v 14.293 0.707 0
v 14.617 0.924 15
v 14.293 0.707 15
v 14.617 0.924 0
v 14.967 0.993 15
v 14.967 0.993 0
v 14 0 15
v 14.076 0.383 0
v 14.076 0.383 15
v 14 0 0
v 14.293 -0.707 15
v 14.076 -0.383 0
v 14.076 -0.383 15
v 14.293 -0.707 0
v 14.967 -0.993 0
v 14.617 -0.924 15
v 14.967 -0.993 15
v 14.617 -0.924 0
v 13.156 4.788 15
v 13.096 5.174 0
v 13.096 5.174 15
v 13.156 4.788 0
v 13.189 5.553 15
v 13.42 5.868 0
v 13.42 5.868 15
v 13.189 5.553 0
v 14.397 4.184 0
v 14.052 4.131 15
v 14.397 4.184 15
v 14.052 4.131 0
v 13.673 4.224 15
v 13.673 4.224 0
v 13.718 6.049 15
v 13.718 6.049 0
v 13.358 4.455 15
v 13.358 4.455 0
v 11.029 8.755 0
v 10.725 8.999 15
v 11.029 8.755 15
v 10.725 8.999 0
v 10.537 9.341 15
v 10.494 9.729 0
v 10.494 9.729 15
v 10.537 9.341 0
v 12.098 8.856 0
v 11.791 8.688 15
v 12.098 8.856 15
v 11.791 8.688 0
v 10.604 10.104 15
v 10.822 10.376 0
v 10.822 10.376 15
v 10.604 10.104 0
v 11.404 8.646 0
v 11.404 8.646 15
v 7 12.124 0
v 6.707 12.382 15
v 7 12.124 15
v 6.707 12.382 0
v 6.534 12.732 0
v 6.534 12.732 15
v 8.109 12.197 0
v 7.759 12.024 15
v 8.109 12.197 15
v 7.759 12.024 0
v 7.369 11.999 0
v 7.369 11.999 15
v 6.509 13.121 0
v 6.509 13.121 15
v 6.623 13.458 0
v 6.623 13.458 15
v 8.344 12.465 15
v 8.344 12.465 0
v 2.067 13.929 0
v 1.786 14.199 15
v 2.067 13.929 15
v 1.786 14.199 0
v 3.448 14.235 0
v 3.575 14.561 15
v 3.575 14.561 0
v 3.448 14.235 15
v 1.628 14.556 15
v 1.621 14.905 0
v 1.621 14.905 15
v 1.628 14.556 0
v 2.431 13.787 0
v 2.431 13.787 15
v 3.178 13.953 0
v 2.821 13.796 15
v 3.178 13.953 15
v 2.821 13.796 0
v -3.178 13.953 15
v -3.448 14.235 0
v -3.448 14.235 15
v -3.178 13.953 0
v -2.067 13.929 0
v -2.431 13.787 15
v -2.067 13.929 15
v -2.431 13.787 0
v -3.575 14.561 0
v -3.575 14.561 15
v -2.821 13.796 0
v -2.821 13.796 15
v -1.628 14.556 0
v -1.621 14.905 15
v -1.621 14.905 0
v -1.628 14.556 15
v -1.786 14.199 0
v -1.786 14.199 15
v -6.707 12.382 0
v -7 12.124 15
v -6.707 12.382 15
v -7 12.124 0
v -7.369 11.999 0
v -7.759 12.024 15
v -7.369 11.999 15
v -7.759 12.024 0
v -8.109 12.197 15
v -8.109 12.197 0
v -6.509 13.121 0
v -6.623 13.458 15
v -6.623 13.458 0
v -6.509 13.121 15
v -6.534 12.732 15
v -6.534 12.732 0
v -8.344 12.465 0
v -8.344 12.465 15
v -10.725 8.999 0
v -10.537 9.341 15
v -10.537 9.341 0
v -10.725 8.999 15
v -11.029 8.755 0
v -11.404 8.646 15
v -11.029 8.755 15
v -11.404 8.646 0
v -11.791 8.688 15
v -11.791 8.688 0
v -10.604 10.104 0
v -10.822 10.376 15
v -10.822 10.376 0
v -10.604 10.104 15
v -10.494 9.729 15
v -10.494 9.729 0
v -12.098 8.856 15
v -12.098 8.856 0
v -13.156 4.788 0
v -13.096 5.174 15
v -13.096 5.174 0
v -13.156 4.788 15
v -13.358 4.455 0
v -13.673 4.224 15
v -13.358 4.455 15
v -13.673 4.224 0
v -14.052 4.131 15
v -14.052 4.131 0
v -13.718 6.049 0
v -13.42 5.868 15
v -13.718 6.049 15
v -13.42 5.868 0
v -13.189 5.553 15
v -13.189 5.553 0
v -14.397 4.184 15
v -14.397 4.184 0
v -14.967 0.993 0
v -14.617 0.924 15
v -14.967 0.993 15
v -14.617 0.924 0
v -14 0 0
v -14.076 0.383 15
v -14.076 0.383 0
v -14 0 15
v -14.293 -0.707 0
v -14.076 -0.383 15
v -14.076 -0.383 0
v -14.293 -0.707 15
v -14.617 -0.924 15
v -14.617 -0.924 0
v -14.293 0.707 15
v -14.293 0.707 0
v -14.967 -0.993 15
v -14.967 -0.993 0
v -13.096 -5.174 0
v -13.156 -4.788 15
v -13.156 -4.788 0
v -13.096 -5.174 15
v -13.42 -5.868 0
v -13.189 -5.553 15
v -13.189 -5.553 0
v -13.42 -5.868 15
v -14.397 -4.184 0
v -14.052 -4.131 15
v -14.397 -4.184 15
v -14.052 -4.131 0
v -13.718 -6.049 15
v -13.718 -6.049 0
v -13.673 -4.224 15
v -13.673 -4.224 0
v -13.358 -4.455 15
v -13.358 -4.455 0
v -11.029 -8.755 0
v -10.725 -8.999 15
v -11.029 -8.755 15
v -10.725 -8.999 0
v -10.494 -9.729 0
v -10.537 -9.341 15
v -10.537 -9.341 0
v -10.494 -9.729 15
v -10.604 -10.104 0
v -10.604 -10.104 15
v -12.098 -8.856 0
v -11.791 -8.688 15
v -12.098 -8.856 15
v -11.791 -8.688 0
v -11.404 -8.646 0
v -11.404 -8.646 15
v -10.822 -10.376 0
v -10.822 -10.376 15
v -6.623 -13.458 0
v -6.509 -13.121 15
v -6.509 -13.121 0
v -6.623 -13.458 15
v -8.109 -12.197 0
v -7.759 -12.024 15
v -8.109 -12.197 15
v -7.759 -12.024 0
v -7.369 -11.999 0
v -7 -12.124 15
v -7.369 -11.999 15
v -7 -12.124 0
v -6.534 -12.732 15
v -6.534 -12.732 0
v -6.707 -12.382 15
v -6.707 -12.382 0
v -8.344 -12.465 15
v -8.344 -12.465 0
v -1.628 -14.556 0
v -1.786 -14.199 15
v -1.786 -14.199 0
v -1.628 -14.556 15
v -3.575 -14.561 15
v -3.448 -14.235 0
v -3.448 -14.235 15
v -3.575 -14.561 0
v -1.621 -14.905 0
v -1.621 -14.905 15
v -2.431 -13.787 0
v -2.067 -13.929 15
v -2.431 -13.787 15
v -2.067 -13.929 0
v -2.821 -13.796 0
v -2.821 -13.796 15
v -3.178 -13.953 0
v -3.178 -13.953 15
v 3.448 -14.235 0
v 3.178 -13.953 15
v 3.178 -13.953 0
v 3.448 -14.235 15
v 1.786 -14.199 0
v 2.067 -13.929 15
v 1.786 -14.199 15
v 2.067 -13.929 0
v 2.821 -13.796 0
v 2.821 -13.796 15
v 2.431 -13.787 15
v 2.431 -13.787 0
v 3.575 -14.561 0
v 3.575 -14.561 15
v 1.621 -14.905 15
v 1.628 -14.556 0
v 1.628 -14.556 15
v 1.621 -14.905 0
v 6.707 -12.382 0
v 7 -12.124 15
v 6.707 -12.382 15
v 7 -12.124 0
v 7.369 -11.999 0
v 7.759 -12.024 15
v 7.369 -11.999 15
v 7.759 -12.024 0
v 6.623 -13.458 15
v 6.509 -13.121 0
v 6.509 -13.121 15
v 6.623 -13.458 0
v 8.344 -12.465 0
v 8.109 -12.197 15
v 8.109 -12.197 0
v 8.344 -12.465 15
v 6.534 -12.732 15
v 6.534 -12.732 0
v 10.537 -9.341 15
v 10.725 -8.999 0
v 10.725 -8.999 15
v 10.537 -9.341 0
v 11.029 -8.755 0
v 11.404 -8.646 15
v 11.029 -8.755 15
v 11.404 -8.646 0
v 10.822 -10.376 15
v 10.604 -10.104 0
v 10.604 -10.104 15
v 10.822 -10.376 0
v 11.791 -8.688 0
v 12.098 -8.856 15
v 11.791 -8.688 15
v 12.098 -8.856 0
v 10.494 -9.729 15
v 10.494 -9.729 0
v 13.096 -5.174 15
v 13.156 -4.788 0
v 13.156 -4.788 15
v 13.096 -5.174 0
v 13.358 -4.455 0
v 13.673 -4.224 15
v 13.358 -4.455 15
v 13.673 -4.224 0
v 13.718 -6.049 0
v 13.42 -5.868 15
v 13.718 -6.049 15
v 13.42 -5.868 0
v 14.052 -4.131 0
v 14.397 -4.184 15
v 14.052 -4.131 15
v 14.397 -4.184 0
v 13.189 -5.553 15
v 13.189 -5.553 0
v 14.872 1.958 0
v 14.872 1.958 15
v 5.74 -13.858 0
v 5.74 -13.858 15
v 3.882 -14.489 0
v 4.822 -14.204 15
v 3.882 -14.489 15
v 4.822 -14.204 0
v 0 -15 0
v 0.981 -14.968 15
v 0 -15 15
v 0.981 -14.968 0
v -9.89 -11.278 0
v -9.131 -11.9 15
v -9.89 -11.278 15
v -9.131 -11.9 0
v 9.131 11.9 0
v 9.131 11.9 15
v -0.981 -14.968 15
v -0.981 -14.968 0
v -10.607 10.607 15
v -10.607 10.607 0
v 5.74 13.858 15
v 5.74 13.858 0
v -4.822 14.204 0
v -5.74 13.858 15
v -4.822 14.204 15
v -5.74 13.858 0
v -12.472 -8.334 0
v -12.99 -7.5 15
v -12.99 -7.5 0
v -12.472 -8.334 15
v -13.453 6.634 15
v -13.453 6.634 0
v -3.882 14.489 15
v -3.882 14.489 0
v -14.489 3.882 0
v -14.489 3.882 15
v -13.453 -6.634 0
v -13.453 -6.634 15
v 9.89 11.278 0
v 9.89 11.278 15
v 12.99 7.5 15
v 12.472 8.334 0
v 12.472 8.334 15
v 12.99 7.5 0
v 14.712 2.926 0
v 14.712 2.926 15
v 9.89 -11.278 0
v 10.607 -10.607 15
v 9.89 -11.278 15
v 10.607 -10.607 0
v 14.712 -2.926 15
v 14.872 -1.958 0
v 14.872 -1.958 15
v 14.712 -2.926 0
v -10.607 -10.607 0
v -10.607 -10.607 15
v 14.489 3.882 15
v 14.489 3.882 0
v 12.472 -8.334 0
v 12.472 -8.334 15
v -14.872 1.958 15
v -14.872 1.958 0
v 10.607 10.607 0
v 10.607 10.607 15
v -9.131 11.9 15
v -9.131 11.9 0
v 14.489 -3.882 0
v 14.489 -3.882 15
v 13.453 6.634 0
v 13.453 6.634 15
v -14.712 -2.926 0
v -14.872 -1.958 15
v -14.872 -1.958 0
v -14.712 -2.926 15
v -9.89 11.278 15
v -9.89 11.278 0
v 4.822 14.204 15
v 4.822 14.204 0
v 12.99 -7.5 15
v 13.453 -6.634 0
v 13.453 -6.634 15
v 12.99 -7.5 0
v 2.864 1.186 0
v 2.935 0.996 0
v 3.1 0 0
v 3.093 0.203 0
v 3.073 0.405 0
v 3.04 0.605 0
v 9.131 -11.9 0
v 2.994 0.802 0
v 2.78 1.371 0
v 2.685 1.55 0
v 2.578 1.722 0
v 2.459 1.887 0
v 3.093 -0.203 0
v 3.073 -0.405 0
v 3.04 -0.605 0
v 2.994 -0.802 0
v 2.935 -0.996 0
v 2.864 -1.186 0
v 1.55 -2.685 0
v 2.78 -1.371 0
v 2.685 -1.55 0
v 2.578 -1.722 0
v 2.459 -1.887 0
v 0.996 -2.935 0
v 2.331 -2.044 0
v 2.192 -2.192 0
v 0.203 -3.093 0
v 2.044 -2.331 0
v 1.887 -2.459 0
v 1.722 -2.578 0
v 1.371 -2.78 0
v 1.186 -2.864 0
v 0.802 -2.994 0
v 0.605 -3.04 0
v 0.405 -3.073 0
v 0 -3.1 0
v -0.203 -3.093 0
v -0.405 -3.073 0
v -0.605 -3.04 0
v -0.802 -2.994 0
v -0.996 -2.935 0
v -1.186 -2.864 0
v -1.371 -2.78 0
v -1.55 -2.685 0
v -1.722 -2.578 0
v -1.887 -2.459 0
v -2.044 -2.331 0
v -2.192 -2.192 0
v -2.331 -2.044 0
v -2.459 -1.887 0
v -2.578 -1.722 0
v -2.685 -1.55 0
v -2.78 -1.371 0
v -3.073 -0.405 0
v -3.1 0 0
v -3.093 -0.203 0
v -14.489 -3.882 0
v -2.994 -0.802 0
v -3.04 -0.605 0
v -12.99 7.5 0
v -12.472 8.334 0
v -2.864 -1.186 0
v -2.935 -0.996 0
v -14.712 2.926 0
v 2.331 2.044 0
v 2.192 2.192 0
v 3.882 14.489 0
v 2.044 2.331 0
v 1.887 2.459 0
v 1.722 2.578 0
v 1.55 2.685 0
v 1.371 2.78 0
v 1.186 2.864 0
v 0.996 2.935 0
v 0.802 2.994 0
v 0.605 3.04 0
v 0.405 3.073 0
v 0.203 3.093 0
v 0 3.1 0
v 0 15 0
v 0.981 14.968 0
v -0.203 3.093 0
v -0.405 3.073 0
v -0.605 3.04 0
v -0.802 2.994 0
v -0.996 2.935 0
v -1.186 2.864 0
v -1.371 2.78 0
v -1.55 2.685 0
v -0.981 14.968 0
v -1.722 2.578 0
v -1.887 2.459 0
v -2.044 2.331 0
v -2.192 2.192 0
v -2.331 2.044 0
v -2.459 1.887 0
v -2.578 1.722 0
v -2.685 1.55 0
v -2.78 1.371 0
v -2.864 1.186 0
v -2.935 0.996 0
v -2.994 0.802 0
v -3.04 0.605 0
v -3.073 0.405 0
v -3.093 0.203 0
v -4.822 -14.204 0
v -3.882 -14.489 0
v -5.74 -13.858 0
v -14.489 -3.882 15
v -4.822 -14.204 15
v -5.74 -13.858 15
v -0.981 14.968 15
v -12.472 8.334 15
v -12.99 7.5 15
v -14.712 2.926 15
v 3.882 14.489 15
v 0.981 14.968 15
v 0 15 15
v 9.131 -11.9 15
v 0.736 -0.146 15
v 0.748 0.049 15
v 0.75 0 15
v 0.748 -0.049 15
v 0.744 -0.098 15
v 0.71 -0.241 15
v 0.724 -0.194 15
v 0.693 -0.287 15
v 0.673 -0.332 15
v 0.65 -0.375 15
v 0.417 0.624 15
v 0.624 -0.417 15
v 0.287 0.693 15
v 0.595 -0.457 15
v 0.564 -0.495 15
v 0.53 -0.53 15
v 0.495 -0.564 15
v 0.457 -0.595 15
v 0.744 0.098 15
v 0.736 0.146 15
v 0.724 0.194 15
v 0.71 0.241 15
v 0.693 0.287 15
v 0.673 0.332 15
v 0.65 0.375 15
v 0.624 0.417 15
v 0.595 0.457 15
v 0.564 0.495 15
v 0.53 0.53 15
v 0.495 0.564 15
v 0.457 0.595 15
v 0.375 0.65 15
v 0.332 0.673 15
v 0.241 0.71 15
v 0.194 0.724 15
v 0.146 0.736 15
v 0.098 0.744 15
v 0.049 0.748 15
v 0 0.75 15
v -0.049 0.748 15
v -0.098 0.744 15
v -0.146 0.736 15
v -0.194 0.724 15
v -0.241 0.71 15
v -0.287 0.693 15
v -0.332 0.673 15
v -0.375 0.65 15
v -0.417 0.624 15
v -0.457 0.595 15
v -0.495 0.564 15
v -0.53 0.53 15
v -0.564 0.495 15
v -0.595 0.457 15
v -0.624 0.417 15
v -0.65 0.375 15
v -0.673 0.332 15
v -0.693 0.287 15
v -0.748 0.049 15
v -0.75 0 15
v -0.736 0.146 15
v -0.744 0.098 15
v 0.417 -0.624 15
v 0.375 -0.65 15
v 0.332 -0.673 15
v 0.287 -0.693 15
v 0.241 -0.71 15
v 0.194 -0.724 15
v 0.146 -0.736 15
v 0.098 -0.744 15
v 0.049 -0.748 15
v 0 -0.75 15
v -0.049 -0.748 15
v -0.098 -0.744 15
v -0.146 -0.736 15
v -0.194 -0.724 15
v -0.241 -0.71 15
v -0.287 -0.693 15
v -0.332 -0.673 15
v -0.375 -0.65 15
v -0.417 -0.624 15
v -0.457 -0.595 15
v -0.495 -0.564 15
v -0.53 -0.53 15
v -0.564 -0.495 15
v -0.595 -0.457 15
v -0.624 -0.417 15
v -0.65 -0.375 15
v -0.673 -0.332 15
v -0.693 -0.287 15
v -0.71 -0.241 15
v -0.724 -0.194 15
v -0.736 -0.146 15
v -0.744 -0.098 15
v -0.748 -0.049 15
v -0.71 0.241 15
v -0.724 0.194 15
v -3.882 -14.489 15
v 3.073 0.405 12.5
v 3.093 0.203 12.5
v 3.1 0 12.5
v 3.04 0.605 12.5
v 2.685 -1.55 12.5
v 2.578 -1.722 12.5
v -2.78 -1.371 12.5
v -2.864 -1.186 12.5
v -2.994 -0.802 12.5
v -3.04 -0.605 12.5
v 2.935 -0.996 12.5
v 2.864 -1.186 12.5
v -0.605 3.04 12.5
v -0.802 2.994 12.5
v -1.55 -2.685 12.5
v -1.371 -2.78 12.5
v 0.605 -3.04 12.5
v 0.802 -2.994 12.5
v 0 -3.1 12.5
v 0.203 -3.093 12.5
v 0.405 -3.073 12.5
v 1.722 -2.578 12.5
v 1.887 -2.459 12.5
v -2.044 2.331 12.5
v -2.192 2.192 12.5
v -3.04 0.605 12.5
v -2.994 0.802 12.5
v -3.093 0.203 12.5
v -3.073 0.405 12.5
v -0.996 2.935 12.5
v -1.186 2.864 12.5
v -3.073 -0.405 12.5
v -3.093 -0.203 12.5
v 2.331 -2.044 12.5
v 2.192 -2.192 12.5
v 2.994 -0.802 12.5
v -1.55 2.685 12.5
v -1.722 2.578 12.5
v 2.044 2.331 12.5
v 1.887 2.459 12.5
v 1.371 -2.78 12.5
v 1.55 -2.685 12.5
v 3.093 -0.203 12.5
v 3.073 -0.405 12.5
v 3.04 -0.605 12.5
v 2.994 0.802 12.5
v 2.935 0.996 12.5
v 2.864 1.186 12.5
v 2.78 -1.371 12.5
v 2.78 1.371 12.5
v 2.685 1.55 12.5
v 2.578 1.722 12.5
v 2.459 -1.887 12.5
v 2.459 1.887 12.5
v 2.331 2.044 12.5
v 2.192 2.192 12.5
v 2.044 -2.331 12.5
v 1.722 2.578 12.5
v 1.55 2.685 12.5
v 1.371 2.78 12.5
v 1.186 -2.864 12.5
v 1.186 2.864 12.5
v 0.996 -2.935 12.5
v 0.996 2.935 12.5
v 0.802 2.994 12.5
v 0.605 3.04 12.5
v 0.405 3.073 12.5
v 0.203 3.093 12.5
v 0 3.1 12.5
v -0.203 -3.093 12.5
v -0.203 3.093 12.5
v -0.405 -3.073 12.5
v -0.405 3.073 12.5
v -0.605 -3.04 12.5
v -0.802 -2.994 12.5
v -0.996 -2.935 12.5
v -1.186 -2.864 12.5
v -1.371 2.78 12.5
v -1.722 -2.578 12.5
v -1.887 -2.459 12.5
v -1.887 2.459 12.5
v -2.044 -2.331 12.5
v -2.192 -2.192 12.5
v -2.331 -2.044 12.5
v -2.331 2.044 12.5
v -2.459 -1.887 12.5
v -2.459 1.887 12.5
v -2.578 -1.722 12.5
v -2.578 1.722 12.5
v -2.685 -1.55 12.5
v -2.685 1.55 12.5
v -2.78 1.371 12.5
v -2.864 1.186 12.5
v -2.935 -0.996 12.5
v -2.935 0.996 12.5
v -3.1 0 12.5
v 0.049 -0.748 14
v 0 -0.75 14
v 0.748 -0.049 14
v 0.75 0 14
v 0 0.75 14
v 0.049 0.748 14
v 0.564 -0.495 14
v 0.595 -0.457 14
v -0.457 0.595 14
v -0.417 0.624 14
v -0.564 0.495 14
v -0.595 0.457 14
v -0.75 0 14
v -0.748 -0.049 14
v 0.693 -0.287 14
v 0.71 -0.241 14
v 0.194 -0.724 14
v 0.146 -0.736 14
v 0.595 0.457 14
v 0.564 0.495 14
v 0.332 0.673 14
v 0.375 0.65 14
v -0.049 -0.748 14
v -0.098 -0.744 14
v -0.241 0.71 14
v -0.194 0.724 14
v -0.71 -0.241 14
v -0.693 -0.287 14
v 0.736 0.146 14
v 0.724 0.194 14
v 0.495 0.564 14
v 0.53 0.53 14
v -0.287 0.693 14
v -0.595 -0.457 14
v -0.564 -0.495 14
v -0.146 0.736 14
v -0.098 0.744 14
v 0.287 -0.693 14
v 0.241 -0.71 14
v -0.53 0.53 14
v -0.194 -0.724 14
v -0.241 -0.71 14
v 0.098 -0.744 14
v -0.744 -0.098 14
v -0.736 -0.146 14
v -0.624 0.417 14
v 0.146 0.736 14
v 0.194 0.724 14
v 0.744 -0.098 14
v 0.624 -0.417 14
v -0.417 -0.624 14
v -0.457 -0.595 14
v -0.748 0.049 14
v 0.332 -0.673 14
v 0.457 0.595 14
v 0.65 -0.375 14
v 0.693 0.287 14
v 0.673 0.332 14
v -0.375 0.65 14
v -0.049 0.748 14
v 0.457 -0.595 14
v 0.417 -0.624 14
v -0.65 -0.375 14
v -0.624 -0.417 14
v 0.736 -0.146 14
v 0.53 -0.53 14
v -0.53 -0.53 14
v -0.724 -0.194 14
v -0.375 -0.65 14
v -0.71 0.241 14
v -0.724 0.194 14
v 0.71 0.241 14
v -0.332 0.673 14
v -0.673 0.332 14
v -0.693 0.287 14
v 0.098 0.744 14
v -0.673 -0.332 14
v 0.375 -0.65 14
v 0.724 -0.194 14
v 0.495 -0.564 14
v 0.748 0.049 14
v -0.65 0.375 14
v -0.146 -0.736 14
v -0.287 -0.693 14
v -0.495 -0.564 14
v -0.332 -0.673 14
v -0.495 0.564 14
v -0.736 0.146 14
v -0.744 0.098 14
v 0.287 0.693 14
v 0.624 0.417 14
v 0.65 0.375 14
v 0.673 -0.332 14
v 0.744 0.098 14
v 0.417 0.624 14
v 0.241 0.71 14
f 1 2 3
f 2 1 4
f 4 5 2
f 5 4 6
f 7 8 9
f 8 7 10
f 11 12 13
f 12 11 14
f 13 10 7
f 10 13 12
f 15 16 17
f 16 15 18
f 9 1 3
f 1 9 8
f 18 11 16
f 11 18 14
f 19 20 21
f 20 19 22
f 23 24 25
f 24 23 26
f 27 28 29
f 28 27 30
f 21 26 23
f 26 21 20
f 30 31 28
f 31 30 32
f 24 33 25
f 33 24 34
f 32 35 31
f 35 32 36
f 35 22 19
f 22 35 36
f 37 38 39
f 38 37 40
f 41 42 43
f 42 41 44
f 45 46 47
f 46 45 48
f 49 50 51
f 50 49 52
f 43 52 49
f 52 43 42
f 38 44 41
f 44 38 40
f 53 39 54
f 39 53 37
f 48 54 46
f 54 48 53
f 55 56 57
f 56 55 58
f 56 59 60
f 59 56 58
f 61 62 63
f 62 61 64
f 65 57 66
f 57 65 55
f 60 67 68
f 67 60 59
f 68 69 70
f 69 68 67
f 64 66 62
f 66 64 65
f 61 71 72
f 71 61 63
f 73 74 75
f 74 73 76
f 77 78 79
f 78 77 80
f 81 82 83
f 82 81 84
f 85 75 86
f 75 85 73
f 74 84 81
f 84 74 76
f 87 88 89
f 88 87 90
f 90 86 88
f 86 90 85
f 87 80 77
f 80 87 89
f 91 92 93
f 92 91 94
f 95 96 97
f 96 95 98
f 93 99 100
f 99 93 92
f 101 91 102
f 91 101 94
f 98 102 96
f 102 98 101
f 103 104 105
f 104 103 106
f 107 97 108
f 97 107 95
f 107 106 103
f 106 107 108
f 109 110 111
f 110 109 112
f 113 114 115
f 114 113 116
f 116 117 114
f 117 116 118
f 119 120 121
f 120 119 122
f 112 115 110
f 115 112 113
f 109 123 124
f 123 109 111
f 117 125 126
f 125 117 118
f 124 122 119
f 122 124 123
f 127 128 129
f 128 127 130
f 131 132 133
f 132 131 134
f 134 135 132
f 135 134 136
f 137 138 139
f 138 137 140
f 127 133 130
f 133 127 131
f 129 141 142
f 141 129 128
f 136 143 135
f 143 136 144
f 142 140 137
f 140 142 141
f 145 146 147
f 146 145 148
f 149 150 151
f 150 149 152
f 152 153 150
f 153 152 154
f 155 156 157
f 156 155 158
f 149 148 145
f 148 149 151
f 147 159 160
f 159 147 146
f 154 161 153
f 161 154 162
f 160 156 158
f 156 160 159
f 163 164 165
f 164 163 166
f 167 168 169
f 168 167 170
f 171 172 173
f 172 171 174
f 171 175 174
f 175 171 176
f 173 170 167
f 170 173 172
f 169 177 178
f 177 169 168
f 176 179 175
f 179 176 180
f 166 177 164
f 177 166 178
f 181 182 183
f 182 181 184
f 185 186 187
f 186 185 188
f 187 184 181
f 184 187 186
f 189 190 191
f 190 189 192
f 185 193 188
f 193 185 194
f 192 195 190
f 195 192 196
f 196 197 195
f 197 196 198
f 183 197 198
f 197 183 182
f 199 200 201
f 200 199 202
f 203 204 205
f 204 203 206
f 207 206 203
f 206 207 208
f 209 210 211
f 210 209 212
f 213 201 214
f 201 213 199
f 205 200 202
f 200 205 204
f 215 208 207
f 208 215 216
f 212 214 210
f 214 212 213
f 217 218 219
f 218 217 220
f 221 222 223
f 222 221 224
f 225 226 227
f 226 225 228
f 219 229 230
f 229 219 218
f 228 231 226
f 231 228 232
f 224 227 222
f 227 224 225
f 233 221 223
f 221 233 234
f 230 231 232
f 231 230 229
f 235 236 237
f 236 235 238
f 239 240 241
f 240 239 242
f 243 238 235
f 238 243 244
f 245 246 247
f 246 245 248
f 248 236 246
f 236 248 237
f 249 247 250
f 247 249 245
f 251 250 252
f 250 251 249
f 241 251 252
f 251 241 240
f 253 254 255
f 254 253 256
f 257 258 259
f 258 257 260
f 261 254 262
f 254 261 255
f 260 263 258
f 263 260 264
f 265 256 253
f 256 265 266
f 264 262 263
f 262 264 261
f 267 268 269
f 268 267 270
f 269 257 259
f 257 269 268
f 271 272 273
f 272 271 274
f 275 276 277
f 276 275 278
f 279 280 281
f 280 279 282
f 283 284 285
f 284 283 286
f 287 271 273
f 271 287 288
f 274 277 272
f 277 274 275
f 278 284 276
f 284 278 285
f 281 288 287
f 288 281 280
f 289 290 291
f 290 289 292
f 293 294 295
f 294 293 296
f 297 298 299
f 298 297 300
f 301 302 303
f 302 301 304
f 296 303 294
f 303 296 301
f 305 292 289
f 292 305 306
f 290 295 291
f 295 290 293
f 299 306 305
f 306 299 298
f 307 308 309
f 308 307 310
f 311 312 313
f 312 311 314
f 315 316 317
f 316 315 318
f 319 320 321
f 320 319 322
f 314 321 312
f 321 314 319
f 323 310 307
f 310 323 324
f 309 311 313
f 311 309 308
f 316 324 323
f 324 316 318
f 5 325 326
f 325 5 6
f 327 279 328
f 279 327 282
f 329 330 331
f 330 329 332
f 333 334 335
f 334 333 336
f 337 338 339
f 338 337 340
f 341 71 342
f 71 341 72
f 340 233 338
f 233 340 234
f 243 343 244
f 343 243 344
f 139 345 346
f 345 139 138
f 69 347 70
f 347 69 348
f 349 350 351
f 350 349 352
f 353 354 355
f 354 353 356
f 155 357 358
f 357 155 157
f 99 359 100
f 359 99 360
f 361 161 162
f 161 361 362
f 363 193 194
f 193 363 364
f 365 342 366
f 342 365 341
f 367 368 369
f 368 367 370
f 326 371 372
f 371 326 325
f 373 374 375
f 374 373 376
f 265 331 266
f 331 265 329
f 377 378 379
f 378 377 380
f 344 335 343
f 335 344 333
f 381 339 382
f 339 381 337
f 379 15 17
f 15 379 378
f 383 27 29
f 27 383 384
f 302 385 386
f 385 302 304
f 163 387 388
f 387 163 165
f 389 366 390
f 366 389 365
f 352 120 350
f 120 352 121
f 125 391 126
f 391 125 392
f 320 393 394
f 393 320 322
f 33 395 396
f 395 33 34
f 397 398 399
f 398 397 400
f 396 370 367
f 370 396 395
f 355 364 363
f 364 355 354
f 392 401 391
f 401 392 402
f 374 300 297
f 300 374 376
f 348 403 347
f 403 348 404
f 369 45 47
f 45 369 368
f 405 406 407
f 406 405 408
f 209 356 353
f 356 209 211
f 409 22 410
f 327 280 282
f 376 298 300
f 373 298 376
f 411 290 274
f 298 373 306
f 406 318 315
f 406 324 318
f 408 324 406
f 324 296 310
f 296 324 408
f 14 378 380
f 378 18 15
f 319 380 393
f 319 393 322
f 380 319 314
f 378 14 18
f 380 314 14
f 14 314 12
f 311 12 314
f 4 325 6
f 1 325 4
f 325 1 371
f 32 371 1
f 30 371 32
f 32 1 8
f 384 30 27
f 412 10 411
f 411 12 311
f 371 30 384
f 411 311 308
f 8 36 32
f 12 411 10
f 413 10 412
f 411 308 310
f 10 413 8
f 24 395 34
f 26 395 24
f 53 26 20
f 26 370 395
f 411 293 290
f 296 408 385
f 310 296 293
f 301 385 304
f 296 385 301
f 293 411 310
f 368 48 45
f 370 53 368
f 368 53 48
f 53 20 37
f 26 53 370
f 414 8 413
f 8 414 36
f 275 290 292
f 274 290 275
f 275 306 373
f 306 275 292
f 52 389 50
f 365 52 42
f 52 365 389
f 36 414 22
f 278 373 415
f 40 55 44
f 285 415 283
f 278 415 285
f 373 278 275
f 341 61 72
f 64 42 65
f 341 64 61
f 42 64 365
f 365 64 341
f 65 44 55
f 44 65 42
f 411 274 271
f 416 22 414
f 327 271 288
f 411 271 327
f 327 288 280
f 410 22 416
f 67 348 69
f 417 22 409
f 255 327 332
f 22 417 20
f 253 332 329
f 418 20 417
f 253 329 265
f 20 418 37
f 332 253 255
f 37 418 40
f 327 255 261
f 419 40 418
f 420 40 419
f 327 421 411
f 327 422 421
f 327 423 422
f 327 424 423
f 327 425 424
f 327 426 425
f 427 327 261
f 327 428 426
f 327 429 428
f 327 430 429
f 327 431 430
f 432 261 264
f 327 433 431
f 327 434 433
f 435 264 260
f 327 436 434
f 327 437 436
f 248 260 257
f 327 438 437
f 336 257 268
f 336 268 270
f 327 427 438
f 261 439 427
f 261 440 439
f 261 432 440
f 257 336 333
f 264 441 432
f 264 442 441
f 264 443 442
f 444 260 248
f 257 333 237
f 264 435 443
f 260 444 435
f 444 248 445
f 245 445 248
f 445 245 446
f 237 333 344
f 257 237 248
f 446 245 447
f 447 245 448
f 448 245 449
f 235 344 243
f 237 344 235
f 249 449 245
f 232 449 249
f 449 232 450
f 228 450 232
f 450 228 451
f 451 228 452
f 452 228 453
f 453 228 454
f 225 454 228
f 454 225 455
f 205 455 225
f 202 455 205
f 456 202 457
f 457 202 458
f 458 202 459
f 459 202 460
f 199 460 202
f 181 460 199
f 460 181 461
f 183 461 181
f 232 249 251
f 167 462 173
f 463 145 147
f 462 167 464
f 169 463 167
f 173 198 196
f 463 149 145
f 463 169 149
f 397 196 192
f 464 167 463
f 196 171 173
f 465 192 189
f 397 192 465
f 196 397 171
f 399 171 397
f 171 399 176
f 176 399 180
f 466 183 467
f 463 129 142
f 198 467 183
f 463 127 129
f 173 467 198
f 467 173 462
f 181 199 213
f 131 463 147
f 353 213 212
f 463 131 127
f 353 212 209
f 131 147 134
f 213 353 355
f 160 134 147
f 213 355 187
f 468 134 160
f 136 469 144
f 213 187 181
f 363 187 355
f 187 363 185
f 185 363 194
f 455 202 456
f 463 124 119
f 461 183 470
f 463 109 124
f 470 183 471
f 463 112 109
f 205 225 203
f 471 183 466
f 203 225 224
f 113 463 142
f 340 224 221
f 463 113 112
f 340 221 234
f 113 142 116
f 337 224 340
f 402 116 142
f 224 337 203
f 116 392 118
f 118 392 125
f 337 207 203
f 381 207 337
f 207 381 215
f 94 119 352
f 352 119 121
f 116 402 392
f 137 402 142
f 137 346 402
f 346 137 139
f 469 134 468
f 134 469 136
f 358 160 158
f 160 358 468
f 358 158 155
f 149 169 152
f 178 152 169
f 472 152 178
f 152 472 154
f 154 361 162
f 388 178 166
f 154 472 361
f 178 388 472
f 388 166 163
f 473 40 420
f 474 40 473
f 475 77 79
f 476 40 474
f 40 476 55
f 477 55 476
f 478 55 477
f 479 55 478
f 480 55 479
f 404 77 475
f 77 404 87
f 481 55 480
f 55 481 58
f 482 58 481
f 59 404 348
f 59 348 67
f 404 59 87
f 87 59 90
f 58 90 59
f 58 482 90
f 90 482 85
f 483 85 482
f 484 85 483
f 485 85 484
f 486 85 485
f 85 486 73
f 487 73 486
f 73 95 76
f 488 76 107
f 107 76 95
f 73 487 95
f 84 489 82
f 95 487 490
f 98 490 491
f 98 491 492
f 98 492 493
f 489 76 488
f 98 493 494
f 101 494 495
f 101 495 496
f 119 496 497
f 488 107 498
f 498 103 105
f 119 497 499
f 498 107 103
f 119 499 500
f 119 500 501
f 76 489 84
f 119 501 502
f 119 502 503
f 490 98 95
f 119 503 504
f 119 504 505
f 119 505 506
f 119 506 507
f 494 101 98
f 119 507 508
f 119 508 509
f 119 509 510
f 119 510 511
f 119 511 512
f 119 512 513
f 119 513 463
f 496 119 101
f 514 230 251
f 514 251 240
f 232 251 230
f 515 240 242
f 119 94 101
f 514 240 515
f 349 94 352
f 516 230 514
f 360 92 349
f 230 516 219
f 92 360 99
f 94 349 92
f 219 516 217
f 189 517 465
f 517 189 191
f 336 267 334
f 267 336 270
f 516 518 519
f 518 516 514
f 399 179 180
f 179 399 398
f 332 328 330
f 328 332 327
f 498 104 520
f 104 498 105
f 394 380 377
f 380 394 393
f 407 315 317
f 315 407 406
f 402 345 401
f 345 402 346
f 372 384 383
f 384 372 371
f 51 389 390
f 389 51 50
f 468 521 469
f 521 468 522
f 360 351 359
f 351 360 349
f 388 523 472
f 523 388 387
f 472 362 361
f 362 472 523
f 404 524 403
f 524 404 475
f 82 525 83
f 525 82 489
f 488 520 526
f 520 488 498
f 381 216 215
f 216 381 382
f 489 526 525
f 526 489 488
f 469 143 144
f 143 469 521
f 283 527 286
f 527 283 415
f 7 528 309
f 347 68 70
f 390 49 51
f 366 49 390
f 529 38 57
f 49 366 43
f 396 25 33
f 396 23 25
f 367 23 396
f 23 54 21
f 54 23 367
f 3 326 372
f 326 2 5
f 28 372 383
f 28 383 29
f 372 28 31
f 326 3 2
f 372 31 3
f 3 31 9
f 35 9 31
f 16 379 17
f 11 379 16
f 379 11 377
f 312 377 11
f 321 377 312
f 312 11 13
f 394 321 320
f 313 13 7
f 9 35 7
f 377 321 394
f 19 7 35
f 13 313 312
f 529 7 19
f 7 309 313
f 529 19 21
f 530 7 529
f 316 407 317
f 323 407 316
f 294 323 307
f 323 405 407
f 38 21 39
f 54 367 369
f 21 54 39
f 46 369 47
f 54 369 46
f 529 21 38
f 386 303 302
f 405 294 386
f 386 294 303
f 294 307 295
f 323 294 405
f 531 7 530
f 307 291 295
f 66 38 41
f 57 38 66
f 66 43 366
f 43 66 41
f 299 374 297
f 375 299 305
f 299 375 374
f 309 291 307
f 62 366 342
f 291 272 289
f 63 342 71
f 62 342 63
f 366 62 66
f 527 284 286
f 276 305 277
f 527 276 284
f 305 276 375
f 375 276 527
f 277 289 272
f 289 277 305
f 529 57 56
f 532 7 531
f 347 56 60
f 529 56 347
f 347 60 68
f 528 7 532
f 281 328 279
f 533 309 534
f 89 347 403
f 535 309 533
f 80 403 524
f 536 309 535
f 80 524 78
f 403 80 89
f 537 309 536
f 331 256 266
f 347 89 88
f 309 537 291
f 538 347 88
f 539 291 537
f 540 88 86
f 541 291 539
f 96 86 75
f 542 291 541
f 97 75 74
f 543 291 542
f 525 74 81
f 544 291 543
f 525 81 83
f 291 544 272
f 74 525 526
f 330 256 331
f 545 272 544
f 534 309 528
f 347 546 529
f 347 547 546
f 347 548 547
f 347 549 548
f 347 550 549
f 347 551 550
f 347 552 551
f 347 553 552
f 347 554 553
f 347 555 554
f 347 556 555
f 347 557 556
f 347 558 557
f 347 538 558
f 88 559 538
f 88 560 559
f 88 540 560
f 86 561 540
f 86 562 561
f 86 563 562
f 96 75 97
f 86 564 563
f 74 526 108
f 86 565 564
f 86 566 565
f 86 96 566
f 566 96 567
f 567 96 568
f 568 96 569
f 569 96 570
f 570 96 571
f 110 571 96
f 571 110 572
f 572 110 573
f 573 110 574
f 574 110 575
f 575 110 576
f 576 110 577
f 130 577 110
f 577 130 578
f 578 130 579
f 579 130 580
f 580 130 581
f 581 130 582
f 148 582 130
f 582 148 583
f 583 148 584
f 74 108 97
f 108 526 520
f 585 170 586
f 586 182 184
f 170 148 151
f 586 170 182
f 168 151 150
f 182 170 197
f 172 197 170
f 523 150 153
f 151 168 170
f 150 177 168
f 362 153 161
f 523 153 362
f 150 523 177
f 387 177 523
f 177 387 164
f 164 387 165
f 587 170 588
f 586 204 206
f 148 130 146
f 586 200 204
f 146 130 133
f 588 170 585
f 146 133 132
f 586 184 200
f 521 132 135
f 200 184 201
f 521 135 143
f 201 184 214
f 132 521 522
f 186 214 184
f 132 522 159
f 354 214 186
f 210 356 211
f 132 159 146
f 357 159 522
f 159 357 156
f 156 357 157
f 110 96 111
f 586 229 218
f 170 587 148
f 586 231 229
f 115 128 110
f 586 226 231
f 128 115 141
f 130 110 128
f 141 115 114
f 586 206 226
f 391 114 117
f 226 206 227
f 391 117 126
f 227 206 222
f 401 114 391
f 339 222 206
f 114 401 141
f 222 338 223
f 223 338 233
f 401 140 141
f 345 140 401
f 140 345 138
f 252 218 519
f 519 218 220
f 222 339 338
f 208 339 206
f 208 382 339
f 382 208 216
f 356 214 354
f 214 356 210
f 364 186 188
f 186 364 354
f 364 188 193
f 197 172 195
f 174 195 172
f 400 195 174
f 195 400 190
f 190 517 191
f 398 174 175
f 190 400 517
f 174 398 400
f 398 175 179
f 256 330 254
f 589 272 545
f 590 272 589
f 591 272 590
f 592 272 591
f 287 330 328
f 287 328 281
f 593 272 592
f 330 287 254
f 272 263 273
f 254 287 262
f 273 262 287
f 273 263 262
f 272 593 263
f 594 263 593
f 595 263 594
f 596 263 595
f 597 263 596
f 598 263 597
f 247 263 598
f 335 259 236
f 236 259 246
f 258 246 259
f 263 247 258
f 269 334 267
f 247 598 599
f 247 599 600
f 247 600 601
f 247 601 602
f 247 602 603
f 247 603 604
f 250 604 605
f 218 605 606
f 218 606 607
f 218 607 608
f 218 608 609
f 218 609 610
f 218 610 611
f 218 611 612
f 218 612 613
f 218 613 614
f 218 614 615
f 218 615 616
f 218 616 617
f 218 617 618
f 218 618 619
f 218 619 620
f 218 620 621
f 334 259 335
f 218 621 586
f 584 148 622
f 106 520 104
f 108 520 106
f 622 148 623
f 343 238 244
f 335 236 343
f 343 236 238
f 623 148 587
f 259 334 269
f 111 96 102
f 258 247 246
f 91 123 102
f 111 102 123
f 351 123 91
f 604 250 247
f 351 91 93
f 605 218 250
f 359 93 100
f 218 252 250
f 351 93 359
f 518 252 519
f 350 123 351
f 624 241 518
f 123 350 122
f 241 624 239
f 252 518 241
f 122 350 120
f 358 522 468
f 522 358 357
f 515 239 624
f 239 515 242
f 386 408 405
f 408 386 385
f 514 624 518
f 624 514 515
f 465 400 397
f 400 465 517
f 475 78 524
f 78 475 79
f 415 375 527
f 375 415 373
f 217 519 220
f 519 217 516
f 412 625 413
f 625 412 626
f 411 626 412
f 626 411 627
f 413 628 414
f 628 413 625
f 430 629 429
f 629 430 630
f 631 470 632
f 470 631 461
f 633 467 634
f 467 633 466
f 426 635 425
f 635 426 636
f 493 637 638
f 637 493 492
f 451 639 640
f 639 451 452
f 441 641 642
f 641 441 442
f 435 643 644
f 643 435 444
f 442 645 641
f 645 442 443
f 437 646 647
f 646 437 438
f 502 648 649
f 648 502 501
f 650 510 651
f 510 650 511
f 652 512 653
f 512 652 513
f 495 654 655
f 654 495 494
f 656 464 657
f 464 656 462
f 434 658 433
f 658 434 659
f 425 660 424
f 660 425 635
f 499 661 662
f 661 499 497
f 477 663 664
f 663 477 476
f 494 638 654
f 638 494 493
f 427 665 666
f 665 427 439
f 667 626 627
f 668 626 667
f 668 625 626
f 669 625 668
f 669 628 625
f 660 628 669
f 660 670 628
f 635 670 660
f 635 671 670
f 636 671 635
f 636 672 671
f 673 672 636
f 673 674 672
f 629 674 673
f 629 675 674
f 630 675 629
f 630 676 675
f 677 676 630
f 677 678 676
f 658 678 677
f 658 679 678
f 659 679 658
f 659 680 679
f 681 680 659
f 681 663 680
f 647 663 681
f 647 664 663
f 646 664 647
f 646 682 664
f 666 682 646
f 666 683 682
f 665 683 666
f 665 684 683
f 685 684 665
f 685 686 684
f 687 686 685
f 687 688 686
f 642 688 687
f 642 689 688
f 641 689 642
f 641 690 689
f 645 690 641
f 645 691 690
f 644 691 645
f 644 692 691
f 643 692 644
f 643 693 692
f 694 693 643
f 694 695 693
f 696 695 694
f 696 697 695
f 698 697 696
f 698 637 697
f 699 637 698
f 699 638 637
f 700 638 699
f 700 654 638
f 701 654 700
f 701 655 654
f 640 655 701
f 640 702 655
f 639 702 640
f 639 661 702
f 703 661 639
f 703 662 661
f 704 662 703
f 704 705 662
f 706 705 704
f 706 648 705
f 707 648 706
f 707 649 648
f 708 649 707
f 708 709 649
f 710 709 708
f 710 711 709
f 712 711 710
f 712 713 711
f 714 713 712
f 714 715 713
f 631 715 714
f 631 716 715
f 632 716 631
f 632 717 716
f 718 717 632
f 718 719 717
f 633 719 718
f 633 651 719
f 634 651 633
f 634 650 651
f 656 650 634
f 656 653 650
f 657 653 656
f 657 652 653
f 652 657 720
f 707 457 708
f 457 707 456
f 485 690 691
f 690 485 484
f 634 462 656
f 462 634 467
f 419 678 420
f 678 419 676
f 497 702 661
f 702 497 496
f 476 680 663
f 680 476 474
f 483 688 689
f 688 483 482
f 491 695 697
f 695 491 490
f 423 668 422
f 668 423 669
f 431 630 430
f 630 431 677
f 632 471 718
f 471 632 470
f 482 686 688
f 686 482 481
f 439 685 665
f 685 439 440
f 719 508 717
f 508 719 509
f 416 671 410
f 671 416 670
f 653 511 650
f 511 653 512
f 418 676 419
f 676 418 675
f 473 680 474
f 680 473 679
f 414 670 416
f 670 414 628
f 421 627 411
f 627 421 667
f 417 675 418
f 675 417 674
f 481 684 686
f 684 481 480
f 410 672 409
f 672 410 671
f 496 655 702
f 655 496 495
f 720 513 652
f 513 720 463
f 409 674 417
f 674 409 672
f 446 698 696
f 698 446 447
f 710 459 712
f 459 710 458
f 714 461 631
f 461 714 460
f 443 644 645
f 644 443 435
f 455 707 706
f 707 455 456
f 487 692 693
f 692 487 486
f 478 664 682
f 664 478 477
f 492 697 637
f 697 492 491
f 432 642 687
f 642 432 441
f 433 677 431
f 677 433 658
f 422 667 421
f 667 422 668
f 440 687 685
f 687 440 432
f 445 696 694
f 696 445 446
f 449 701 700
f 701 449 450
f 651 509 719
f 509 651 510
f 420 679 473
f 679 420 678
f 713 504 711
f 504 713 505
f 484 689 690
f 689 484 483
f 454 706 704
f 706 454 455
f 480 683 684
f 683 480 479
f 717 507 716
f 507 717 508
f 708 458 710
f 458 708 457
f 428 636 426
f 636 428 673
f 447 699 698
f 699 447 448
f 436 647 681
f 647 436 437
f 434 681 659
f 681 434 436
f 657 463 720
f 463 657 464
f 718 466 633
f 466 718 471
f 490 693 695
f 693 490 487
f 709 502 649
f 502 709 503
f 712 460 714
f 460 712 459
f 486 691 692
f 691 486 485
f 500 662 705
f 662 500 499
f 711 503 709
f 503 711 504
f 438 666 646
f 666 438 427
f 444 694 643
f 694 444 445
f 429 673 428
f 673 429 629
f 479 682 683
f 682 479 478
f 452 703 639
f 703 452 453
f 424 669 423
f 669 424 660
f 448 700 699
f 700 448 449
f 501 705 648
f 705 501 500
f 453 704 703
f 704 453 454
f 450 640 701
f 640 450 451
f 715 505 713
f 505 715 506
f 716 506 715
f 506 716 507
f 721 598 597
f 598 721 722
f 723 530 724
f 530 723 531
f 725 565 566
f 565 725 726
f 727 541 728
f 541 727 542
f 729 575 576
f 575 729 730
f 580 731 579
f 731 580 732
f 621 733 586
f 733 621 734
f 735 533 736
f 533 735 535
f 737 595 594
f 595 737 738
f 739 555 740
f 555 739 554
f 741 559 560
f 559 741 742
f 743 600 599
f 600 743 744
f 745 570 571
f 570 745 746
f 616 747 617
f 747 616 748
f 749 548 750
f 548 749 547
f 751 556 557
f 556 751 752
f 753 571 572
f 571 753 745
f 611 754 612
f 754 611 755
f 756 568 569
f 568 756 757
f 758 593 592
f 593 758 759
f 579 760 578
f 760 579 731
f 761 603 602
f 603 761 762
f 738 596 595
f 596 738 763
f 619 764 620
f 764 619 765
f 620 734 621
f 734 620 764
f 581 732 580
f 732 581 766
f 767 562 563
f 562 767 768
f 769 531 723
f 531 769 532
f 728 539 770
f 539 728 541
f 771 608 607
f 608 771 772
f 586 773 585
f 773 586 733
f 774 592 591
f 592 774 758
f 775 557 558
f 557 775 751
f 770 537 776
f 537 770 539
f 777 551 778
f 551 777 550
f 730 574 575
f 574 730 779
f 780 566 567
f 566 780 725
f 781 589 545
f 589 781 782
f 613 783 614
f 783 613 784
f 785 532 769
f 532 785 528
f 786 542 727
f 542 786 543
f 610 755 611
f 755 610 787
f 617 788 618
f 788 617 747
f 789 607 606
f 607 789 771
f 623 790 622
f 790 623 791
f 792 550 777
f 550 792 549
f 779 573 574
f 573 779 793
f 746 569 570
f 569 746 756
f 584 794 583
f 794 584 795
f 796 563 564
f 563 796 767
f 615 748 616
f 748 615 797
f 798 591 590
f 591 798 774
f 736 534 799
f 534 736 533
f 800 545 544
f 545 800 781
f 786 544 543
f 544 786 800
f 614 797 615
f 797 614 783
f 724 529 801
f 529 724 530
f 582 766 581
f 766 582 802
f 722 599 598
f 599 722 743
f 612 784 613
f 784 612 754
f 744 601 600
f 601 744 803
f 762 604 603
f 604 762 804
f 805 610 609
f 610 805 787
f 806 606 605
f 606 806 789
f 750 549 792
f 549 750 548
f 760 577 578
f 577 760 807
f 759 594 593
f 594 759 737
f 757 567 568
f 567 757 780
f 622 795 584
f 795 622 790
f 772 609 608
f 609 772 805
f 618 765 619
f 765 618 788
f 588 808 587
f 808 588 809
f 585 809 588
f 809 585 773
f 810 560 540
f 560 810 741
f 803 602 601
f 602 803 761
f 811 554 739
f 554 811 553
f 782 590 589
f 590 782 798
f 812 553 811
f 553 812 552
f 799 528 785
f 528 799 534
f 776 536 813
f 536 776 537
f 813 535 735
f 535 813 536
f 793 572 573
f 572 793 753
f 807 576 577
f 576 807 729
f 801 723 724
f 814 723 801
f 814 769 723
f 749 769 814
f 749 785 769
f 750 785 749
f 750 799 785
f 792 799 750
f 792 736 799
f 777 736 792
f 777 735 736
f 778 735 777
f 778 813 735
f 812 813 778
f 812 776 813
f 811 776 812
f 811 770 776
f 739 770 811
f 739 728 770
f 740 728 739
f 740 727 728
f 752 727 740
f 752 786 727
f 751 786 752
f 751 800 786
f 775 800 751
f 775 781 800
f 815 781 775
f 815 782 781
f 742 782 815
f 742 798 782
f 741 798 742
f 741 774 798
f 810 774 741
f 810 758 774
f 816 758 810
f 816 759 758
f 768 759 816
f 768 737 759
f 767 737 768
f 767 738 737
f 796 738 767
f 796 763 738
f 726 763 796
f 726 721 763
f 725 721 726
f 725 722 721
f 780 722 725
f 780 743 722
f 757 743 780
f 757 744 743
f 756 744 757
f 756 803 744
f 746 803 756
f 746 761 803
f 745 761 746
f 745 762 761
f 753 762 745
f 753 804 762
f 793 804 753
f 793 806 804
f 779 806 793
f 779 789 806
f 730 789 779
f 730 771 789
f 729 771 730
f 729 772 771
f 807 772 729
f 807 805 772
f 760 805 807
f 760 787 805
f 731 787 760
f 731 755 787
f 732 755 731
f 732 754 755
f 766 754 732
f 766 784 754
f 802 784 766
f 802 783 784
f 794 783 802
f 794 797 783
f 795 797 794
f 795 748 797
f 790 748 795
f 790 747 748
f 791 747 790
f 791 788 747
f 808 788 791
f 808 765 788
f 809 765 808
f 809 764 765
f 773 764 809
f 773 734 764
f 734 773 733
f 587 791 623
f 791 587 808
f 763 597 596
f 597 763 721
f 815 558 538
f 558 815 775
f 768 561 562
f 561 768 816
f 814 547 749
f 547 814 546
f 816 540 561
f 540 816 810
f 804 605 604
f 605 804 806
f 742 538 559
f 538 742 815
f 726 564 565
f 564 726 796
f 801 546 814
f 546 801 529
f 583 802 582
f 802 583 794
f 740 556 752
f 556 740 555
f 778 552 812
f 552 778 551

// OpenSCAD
// Replacement knob for hotplate stirrer (D-shaft 6 mm)
// Print orientation: flat bottom face on bed (z = 0)

$fn = 96;

// --- Dimensions (mm) ---
knob_d        = 30;    // knob outer diameter
knob_h        = 15;    // knob height
bore_depth    = 12;    // D-bore depth from bottom face
bore_w        = 4.7;   // D-bore width (flat to opposite side)
bore_d        = 6.2;   // D-bore circle diameter
groove_count  = 18;    // number of grip grooves
groove_d      = 2;     // grip groove diameter
pointer_w     = 1.5;   // pointer groove width
pointer_d     = 1;     // pointer groove depth

eps           = 0.5;   // overcut for clean differences

difference() {
    // Main body
    cylinder(d = knob_d, h = knob_h);

    // D-shaped blind bore from bottom face
    translate([0, 0, -eps])
        cylinder(d = bore_d, h = bore_depth + 2 * eps);
    translate([-(bore_w - bore_d) / 2, 0, -eps])
        cube([(bore_w - bore_d) / 2, bore_depth + 2 * eps, bore_d]);

    // Vertical grip grooves along full height
    for (i = [0 : groove_count - 1]) {
        rotate([0, 0, i * 360 / groove_count])
            translate([knob_d / 2, 0, -eps])
                cylinder(d = groove_d, h = knob_h + 2 * eps, $fn = 16);
    }

    // Pointer groove from centre to outer edge
    translate([0, 0, knob_h - pointer_d])
        linear_extrude(height = pointer_d)
            circle(d = pointer_w);
}
